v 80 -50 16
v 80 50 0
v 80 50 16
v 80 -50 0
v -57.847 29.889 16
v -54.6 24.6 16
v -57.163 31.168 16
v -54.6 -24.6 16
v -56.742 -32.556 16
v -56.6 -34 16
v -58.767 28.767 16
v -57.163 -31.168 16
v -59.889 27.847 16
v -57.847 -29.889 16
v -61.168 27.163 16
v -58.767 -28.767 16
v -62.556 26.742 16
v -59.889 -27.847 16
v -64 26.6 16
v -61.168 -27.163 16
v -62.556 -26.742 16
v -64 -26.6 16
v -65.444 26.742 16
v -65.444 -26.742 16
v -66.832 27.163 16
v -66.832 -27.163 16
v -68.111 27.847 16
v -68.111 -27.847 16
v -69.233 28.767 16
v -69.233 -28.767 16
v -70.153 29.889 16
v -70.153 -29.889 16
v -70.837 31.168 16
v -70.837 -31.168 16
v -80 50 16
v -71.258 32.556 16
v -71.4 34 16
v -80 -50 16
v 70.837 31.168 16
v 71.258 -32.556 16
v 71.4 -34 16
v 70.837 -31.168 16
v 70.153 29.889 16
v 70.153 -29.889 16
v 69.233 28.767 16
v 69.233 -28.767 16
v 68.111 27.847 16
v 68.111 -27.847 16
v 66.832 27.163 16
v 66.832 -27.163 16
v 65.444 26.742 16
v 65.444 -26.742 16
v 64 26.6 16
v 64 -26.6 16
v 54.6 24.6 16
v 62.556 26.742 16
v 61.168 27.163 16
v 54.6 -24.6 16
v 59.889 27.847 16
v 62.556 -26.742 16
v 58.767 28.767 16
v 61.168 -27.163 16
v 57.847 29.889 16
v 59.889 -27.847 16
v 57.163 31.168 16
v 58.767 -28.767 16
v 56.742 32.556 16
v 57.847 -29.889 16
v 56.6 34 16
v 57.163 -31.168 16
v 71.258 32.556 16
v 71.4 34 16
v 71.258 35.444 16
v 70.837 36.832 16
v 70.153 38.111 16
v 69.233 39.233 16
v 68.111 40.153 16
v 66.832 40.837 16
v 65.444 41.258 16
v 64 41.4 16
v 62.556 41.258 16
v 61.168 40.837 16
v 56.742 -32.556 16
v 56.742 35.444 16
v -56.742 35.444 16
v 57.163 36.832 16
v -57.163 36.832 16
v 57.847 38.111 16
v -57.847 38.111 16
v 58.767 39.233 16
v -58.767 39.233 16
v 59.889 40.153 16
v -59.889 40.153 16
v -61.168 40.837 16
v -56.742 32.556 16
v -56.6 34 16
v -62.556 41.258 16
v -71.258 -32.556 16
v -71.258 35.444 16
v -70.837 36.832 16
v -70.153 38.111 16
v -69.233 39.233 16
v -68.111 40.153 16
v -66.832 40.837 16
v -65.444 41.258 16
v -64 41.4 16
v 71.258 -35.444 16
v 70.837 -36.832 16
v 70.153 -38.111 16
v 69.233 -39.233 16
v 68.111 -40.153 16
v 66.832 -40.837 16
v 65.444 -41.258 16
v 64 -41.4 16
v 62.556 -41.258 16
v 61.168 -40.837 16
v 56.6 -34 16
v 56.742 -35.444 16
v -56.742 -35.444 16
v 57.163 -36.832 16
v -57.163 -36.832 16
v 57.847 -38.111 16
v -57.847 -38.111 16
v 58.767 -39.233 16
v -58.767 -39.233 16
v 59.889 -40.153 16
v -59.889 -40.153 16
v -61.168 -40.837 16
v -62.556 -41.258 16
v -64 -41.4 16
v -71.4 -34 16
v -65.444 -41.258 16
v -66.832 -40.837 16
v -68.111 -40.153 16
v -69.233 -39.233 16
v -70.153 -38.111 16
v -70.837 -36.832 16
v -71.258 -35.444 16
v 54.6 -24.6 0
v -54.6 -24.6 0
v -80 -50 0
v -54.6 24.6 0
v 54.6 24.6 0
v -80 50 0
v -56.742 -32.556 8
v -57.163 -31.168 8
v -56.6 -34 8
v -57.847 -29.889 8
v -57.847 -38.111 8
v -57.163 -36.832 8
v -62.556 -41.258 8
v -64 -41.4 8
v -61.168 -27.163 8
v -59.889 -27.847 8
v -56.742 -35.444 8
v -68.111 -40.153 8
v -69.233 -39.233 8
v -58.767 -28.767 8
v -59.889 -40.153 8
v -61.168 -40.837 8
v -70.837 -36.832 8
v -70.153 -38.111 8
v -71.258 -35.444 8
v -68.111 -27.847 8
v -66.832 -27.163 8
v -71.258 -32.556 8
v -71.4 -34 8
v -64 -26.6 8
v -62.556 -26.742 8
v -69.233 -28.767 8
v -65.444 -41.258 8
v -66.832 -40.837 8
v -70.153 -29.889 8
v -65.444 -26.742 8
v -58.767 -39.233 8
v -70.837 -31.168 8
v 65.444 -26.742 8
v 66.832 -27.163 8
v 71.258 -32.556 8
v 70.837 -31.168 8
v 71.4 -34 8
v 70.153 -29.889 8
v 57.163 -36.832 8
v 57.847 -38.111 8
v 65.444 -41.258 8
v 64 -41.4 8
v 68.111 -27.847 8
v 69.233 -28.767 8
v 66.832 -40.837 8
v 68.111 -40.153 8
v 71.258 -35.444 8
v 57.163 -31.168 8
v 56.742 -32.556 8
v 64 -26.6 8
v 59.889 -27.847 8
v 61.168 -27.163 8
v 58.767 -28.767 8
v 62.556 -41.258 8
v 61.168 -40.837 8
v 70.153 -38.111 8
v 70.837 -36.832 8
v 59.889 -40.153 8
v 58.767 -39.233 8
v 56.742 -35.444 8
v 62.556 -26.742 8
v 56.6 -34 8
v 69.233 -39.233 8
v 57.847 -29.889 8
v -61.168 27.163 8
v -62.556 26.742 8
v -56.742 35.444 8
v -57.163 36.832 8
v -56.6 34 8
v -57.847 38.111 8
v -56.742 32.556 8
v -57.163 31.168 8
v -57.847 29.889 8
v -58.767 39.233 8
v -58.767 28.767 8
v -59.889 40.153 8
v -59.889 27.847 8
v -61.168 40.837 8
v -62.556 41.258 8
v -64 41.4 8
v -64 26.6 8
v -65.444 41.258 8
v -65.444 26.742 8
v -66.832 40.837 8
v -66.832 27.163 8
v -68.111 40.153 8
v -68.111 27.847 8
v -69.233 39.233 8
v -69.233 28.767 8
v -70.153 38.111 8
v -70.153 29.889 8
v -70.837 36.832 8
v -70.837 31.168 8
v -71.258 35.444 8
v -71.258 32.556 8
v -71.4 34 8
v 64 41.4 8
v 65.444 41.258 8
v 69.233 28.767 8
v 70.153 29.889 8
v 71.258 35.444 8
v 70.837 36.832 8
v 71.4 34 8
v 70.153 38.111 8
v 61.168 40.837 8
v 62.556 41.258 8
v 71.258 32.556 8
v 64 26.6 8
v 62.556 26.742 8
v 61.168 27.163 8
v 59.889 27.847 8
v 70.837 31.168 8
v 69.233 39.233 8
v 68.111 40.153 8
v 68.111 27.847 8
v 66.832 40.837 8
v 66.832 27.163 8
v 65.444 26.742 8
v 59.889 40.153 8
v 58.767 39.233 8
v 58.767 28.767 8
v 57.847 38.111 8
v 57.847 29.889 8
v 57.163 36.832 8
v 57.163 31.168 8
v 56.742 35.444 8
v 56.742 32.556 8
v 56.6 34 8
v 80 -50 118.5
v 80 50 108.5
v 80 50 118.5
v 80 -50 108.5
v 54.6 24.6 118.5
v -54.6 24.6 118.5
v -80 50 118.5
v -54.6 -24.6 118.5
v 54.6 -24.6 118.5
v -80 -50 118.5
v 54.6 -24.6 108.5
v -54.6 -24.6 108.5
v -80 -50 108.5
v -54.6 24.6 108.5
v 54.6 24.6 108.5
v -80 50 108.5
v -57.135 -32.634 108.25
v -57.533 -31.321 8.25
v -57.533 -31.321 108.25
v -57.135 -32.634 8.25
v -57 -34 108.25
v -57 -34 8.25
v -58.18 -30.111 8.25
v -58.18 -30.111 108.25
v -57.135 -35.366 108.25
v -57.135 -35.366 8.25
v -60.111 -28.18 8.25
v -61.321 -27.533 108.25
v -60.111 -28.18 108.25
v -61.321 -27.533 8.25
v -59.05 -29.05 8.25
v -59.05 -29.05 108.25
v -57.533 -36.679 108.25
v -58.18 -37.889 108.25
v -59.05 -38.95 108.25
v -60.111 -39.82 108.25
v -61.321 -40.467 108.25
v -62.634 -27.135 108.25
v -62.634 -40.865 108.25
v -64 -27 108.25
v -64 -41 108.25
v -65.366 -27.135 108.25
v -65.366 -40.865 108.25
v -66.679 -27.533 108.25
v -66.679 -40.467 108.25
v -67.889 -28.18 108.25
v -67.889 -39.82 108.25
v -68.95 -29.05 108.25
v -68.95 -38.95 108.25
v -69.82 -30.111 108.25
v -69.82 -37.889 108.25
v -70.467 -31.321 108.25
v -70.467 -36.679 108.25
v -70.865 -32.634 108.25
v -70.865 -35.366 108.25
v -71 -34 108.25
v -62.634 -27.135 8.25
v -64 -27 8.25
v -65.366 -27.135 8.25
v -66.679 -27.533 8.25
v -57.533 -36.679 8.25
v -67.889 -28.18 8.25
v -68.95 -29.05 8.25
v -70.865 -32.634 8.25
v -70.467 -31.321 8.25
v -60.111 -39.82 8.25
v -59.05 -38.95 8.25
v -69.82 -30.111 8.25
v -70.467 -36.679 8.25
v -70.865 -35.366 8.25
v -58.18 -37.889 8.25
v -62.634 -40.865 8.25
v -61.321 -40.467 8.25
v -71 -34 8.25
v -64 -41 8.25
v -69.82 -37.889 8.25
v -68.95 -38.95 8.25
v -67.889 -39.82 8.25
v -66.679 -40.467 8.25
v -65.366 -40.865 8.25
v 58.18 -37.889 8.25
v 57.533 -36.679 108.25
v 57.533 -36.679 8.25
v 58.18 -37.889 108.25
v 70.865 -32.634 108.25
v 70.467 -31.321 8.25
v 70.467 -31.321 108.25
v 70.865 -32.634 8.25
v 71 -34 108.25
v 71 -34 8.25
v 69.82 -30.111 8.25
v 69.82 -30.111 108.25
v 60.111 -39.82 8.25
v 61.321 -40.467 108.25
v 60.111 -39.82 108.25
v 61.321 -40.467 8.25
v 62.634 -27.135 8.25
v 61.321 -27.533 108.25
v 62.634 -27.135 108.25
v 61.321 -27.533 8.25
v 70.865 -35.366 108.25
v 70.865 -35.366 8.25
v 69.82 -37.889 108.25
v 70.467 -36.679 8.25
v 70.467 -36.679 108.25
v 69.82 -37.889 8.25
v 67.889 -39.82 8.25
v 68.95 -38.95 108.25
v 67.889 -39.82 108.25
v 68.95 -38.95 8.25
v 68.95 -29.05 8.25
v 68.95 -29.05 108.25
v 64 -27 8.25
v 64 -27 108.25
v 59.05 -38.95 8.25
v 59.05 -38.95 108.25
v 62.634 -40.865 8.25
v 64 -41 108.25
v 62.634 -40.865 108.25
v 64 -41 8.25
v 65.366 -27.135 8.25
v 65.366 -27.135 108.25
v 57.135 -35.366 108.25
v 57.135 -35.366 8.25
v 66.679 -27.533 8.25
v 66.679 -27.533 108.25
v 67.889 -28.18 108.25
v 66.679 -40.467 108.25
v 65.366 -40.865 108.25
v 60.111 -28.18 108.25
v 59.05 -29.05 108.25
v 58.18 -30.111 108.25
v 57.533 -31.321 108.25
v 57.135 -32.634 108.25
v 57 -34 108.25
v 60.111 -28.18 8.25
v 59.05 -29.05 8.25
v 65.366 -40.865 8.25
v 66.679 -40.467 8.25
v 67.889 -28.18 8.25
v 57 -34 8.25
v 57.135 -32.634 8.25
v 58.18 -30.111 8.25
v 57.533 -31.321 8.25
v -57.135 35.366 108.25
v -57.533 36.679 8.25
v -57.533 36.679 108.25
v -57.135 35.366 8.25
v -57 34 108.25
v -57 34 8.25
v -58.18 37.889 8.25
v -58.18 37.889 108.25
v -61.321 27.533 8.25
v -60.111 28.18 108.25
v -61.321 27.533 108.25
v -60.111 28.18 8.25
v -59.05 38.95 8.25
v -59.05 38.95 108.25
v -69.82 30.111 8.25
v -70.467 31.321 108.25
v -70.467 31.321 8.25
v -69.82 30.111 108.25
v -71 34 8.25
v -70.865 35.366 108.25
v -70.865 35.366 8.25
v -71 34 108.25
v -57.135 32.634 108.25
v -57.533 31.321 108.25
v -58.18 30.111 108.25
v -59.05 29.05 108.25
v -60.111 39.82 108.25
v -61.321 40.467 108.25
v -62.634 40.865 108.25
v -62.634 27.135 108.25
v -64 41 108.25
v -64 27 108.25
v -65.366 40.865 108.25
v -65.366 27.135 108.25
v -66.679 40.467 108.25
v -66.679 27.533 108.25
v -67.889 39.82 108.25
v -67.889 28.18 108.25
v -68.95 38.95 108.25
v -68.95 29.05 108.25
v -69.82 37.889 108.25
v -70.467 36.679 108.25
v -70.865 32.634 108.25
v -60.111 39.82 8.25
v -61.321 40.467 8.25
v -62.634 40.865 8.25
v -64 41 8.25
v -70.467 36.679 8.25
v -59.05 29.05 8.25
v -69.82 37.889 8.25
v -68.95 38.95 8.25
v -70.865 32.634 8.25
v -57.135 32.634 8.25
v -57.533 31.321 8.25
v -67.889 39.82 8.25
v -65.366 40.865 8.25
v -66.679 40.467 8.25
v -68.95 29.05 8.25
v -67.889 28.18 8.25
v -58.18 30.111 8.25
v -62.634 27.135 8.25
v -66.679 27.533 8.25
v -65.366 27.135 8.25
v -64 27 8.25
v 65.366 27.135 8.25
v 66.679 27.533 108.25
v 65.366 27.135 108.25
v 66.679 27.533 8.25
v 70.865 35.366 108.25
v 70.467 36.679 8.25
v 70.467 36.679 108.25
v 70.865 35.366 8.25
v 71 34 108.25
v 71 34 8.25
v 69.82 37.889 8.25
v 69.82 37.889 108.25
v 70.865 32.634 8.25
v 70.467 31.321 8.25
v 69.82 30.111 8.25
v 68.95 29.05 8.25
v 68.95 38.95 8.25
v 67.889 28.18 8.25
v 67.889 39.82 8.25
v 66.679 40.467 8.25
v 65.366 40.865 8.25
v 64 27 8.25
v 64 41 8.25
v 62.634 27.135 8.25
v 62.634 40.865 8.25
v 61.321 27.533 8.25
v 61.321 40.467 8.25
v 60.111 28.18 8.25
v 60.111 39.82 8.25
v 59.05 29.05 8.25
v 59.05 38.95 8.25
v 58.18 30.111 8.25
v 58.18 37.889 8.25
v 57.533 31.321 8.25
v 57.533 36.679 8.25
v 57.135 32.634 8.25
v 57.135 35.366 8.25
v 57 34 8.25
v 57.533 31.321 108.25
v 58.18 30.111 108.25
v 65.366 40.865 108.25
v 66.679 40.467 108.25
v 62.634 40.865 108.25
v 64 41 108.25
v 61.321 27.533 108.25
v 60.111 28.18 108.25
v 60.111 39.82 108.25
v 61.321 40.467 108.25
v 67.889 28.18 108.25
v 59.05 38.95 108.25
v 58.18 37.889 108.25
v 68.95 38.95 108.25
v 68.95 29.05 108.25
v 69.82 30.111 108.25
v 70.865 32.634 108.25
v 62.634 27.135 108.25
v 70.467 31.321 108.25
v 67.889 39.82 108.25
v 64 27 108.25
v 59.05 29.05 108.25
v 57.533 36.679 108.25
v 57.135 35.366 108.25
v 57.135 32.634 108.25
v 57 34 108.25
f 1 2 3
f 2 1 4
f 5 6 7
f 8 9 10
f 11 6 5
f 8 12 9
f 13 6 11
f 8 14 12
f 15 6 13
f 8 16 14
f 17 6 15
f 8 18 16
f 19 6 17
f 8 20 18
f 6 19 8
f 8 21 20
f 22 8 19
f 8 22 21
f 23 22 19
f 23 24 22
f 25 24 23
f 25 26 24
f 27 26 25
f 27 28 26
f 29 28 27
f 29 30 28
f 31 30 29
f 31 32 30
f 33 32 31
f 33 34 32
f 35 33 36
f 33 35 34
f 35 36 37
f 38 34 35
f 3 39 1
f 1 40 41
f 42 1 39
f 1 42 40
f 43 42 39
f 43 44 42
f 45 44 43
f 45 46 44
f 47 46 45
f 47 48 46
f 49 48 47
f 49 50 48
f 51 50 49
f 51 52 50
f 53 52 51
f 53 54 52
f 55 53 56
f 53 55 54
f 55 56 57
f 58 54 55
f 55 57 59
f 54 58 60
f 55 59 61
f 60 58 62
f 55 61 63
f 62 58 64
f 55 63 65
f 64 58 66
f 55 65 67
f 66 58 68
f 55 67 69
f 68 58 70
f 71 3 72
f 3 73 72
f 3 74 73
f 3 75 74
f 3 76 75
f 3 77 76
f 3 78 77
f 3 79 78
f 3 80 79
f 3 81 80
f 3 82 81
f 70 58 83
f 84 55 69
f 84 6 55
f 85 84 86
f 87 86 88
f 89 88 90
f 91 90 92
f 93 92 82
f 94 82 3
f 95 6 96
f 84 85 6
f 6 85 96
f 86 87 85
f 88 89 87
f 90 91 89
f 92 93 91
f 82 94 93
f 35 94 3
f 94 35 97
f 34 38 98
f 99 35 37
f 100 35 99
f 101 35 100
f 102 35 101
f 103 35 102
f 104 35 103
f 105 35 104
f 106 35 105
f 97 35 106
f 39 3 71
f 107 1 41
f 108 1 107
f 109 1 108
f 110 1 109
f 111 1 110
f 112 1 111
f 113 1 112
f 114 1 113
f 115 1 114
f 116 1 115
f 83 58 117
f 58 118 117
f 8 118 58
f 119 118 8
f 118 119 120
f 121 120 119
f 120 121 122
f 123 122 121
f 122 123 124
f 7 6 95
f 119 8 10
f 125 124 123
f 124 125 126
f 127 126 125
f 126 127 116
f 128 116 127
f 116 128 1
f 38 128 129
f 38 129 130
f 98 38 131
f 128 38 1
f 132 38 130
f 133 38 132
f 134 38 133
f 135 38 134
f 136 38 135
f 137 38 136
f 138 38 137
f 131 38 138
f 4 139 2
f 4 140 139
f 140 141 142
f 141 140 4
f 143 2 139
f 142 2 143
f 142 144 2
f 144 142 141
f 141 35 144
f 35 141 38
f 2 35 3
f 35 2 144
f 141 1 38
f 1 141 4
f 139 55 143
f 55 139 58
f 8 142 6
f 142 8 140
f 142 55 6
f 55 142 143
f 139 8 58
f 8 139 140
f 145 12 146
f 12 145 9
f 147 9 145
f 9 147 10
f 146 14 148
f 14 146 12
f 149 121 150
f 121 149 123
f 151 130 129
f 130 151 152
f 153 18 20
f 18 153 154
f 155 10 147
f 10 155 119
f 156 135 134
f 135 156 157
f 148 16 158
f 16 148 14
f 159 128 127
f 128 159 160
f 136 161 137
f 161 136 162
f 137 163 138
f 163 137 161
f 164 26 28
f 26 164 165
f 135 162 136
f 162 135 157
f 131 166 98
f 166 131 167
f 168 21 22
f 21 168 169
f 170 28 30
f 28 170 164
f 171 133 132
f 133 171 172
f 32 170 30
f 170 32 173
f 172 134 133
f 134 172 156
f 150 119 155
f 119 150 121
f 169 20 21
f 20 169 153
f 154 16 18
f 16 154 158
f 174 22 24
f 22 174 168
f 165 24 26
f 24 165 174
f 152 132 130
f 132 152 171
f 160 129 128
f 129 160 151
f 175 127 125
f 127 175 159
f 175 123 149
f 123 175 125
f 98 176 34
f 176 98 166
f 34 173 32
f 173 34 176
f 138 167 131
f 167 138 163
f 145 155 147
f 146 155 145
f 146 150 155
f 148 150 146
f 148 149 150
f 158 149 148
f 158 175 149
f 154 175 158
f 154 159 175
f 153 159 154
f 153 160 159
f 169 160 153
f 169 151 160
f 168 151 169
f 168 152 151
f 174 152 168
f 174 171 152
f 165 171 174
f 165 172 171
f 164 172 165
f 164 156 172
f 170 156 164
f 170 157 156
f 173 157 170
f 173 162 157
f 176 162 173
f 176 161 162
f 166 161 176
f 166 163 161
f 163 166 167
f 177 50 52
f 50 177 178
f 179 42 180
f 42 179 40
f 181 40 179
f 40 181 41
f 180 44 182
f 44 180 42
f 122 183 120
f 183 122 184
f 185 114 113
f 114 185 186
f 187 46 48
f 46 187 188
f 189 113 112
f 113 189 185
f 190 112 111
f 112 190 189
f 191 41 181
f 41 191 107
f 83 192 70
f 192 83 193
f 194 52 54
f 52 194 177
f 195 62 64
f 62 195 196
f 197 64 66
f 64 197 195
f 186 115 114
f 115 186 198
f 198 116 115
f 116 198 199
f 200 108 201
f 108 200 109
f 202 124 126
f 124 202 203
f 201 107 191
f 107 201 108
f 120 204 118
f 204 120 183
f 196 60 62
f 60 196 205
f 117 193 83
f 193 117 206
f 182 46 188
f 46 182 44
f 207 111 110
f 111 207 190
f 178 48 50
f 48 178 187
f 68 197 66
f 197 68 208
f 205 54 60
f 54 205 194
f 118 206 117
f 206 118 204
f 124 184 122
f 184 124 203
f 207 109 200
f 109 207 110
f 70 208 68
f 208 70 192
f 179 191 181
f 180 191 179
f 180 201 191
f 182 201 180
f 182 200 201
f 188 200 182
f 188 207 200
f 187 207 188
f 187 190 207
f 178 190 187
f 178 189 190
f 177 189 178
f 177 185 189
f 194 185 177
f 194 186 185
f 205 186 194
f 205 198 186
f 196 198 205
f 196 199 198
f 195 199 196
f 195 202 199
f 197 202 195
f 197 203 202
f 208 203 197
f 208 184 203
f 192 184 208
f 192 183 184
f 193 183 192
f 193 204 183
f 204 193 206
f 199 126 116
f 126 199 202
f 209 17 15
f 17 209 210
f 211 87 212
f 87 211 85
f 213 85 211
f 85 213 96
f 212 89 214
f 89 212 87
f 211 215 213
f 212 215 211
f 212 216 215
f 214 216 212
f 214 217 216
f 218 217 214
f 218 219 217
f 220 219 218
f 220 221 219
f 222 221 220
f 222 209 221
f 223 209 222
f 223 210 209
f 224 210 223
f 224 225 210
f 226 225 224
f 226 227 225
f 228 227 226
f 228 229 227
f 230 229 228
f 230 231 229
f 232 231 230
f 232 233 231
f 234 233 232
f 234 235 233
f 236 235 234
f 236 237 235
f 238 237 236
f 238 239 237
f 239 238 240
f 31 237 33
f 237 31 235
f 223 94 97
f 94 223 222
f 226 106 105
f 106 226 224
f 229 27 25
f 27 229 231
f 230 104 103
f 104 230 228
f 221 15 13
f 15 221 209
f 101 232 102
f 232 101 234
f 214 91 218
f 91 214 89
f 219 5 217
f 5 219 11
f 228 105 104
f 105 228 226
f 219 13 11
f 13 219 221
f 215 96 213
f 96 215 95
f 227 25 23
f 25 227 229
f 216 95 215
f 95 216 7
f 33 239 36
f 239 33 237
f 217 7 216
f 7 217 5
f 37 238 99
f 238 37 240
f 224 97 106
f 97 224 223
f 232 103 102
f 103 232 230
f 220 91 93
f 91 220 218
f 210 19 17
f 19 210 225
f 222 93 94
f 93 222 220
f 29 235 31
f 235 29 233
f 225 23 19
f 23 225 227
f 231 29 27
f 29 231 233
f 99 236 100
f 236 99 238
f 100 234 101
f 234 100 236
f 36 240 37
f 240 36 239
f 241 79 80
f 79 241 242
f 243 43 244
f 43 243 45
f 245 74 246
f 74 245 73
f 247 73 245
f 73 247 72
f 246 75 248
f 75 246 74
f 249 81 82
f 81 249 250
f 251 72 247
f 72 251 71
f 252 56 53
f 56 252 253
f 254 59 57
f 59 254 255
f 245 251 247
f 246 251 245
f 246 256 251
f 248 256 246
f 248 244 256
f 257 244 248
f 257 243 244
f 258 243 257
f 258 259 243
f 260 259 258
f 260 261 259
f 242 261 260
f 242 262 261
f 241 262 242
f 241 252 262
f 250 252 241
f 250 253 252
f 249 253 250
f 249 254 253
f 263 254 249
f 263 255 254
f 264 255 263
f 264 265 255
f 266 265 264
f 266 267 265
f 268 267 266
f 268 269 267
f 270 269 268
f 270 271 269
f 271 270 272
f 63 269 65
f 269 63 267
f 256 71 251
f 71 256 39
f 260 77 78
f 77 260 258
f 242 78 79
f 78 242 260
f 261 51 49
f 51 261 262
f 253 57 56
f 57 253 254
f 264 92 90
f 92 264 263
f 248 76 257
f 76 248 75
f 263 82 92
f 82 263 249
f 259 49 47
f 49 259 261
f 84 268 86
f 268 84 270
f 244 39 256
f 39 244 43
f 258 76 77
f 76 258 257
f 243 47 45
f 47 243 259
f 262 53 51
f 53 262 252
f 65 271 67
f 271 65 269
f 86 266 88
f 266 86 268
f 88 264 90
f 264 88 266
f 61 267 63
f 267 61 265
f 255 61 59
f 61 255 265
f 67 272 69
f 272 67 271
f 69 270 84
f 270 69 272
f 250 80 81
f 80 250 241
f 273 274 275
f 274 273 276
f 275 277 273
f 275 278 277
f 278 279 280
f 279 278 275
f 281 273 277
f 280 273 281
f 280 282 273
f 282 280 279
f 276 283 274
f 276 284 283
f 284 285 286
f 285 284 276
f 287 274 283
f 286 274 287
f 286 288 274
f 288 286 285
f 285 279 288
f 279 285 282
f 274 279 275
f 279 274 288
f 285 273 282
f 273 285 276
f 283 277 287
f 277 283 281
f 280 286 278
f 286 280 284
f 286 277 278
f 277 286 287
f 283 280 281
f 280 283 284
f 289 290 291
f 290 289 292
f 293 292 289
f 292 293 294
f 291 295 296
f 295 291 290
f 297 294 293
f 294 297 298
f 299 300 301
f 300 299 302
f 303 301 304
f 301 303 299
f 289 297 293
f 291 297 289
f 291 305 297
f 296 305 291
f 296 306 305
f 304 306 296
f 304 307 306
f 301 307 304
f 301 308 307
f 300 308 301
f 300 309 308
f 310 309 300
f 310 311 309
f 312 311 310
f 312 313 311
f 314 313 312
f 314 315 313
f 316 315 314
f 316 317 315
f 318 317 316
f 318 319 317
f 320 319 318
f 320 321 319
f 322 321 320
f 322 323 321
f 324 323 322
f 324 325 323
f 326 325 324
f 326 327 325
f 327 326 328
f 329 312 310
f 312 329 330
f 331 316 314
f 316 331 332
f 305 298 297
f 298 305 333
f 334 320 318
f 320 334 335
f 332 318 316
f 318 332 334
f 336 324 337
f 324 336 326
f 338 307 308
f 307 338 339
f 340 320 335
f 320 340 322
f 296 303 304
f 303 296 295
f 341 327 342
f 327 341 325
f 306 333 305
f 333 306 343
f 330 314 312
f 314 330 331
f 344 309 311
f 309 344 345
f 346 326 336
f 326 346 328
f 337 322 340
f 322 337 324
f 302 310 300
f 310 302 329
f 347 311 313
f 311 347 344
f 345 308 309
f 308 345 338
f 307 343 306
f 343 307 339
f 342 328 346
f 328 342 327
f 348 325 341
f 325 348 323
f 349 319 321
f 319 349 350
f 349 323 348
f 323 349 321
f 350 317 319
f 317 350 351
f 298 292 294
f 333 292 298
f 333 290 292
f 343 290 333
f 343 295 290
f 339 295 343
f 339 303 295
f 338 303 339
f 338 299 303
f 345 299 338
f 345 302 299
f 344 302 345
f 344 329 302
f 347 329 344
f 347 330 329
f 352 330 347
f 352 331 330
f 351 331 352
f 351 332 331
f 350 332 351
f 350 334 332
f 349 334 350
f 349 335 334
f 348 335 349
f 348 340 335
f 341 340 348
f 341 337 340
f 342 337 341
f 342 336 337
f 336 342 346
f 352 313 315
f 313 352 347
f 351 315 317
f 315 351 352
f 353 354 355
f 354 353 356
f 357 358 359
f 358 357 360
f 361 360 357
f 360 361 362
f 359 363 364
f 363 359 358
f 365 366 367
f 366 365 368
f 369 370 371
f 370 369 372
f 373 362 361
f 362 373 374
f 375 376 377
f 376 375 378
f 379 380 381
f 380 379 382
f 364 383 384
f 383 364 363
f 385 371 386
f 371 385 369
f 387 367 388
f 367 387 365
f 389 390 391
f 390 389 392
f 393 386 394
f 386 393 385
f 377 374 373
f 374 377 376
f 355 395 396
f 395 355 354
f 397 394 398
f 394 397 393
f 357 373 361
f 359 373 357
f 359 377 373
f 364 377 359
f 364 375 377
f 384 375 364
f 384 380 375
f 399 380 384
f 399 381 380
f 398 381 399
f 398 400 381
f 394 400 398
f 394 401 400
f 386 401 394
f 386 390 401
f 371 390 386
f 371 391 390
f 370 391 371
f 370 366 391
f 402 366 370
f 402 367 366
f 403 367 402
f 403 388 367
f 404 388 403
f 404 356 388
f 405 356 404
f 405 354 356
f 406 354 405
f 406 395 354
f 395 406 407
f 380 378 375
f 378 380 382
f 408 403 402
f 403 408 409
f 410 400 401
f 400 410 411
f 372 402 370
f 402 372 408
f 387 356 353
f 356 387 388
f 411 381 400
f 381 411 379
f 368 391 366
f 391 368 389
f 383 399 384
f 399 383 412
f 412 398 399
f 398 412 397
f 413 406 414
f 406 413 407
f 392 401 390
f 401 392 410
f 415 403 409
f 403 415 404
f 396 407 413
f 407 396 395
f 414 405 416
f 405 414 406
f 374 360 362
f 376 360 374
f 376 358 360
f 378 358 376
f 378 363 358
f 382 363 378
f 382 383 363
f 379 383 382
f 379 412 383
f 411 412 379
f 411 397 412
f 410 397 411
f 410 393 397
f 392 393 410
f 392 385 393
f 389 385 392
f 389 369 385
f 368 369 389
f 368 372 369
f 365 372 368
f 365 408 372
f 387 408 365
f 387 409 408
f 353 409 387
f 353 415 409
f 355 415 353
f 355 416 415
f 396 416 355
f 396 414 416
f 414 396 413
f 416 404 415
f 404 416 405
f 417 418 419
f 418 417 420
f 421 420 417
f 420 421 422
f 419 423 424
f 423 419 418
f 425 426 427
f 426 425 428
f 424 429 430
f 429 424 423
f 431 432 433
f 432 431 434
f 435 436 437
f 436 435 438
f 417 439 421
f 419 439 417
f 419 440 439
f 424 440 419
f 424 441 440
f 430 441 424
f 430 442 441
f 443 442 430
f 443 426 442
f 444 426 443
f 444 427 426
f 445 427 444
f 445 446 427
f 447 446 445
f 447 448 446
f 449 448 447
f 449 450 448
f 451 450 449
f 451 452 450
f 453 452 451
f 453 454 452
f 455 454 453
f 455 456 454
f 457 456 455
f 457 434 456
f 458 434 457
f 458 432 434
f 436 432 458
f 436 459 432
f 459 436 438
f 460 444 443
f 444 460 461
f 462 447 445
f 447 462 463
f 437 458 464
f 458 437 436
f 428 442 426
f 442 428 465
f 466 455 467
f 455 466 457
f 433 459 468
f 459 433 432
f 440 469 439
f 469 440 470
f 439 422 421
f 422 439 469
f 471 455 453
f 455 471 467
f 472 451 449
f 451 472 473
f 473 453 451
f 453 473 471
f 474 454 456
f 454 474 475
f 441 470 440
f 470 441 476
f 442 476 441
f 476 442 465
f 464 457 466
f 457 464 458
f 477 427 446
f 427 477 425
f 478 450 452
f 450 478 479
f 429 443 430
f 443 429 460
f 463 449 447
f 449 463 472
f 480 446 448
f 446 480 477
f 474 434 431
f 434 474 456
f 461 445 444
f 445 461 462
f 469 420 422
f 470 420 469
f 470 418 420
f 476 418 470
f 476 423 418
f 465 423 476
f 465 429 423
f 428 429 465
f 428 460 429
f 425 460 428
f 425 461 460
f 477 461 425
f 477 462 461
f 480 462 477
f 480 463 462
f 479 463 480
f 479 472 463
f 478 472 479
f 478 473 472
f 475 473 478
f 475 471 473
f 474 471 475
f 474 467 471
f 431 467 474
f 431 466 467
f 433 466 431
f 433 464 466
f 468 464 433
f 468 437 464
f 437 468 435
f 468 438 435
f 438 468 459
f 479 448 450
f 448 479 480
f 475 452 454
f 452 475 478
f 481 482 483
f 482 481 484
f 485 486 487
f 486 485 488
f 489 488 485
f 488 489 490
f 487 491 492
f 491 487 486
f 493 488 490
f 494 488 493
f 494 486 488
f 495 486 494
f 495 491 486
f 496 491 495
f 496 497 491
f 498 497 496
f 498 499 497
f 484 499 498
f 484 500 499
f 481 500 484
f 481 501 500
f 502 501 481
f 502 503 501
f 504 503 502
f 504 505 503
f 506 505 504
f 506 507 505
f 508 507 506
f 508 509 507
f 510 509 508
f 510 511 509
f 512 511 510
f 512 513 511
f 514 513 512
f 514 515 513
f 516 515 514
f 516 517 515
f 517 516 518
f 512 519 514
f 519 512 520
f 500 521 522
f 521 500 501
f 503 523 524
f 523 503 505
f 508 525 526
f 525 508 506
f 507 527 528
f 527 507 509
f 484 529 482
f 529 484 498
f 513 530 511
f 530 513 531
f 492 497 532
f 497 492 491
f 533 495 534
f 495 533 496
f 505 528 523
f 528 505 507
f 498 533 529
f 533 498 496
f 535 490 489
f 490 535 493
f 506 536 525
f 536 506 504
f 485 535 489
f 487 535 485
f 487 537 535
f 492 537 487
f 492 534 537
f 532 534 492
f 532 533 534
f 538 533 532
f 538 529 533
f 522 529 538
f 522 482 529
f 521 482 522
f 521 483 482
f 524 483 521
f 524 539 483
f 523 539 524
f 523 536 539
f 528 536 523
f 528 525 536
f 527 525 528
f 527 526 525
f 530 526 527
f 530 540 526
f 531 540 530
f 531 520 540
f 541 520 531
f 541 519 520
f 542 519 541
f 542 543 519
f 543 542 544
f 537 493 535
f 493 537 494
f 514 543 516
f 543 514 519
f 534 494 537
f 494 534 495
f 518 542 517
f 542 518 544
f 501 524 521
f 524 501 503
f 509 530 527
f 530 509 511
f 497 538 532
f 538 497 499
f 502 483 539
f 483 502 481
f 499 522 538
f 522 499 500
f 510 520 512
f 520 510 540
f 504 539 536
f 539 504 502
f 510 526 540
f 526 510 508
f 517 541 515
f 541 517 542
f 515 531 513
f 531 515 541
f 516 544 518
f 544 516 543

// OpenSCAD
$fn = 32;

// ------------------------------------------------------------------------
// Frame cube: base 160 x 100 mm, posts 100 mm tall
// Every part is its own module, assembly() places every instance.
// ------------------------------------------------------------------------

// --- part 1 ---
module base_frame() {
  difference() {
    translate([-80, -50, 0]) cube([160, 100, 16]);
    translate([-54.6, -24.6, -1]) cube([109.2, 49.2, 18]);
    translate([-64, -34, 8]) cylinder(h = 9, d = 14.8);
    translate([64, -34, 8]) cylinder(h = 9, d = 14.8);
    translate([-64, 34, 8]) cylinder(h = 9, d = 14.8);
    translate([64, 34, 8]) cylinder(h = 9, d = 14.8);
  }
}

// --- part 2 ---
module corner_post() {
  cylinder(h = 100, d = 14);
}

// --- part 3 ---
module top_frame() {
  difference() {
    translate([-80, -50, 0]) cube([160, 100, 10]);
    translate([-54.6, -24.6, -1]) cube([109.2, 49.2, 12]);
  }
}

// --- assembly ---
module assembly() {
  color([0.80, 0.24, 0.20]) translate([0, 0, 0]) rotate([0, 0, 0]) base_frame();
  color([0.20, 0.45, 0.75]) translate([-64, -34, 8.25]) rotate([0, 0, 0]) corner_post();
  color([0.25, 0.62, 0.32]) translate([64, -34, 8.25]) rotate([0, 0, 0]) corner_post();
  color([0.92, 0.70, 0.18]) translate([-64, 34, 8.25]) rotate([0, 0, 0]) corner_post();
  color([0.58, 0.35, 0.70]) translate([64, 34, 8.25]) rotate([0, 0, 0]) corner_post();
  color([0.16, 0.66, 0.66]) translate([0, 0, 108.5]) rotate([0, 0, 0]) top_frame();
}

assembly();
